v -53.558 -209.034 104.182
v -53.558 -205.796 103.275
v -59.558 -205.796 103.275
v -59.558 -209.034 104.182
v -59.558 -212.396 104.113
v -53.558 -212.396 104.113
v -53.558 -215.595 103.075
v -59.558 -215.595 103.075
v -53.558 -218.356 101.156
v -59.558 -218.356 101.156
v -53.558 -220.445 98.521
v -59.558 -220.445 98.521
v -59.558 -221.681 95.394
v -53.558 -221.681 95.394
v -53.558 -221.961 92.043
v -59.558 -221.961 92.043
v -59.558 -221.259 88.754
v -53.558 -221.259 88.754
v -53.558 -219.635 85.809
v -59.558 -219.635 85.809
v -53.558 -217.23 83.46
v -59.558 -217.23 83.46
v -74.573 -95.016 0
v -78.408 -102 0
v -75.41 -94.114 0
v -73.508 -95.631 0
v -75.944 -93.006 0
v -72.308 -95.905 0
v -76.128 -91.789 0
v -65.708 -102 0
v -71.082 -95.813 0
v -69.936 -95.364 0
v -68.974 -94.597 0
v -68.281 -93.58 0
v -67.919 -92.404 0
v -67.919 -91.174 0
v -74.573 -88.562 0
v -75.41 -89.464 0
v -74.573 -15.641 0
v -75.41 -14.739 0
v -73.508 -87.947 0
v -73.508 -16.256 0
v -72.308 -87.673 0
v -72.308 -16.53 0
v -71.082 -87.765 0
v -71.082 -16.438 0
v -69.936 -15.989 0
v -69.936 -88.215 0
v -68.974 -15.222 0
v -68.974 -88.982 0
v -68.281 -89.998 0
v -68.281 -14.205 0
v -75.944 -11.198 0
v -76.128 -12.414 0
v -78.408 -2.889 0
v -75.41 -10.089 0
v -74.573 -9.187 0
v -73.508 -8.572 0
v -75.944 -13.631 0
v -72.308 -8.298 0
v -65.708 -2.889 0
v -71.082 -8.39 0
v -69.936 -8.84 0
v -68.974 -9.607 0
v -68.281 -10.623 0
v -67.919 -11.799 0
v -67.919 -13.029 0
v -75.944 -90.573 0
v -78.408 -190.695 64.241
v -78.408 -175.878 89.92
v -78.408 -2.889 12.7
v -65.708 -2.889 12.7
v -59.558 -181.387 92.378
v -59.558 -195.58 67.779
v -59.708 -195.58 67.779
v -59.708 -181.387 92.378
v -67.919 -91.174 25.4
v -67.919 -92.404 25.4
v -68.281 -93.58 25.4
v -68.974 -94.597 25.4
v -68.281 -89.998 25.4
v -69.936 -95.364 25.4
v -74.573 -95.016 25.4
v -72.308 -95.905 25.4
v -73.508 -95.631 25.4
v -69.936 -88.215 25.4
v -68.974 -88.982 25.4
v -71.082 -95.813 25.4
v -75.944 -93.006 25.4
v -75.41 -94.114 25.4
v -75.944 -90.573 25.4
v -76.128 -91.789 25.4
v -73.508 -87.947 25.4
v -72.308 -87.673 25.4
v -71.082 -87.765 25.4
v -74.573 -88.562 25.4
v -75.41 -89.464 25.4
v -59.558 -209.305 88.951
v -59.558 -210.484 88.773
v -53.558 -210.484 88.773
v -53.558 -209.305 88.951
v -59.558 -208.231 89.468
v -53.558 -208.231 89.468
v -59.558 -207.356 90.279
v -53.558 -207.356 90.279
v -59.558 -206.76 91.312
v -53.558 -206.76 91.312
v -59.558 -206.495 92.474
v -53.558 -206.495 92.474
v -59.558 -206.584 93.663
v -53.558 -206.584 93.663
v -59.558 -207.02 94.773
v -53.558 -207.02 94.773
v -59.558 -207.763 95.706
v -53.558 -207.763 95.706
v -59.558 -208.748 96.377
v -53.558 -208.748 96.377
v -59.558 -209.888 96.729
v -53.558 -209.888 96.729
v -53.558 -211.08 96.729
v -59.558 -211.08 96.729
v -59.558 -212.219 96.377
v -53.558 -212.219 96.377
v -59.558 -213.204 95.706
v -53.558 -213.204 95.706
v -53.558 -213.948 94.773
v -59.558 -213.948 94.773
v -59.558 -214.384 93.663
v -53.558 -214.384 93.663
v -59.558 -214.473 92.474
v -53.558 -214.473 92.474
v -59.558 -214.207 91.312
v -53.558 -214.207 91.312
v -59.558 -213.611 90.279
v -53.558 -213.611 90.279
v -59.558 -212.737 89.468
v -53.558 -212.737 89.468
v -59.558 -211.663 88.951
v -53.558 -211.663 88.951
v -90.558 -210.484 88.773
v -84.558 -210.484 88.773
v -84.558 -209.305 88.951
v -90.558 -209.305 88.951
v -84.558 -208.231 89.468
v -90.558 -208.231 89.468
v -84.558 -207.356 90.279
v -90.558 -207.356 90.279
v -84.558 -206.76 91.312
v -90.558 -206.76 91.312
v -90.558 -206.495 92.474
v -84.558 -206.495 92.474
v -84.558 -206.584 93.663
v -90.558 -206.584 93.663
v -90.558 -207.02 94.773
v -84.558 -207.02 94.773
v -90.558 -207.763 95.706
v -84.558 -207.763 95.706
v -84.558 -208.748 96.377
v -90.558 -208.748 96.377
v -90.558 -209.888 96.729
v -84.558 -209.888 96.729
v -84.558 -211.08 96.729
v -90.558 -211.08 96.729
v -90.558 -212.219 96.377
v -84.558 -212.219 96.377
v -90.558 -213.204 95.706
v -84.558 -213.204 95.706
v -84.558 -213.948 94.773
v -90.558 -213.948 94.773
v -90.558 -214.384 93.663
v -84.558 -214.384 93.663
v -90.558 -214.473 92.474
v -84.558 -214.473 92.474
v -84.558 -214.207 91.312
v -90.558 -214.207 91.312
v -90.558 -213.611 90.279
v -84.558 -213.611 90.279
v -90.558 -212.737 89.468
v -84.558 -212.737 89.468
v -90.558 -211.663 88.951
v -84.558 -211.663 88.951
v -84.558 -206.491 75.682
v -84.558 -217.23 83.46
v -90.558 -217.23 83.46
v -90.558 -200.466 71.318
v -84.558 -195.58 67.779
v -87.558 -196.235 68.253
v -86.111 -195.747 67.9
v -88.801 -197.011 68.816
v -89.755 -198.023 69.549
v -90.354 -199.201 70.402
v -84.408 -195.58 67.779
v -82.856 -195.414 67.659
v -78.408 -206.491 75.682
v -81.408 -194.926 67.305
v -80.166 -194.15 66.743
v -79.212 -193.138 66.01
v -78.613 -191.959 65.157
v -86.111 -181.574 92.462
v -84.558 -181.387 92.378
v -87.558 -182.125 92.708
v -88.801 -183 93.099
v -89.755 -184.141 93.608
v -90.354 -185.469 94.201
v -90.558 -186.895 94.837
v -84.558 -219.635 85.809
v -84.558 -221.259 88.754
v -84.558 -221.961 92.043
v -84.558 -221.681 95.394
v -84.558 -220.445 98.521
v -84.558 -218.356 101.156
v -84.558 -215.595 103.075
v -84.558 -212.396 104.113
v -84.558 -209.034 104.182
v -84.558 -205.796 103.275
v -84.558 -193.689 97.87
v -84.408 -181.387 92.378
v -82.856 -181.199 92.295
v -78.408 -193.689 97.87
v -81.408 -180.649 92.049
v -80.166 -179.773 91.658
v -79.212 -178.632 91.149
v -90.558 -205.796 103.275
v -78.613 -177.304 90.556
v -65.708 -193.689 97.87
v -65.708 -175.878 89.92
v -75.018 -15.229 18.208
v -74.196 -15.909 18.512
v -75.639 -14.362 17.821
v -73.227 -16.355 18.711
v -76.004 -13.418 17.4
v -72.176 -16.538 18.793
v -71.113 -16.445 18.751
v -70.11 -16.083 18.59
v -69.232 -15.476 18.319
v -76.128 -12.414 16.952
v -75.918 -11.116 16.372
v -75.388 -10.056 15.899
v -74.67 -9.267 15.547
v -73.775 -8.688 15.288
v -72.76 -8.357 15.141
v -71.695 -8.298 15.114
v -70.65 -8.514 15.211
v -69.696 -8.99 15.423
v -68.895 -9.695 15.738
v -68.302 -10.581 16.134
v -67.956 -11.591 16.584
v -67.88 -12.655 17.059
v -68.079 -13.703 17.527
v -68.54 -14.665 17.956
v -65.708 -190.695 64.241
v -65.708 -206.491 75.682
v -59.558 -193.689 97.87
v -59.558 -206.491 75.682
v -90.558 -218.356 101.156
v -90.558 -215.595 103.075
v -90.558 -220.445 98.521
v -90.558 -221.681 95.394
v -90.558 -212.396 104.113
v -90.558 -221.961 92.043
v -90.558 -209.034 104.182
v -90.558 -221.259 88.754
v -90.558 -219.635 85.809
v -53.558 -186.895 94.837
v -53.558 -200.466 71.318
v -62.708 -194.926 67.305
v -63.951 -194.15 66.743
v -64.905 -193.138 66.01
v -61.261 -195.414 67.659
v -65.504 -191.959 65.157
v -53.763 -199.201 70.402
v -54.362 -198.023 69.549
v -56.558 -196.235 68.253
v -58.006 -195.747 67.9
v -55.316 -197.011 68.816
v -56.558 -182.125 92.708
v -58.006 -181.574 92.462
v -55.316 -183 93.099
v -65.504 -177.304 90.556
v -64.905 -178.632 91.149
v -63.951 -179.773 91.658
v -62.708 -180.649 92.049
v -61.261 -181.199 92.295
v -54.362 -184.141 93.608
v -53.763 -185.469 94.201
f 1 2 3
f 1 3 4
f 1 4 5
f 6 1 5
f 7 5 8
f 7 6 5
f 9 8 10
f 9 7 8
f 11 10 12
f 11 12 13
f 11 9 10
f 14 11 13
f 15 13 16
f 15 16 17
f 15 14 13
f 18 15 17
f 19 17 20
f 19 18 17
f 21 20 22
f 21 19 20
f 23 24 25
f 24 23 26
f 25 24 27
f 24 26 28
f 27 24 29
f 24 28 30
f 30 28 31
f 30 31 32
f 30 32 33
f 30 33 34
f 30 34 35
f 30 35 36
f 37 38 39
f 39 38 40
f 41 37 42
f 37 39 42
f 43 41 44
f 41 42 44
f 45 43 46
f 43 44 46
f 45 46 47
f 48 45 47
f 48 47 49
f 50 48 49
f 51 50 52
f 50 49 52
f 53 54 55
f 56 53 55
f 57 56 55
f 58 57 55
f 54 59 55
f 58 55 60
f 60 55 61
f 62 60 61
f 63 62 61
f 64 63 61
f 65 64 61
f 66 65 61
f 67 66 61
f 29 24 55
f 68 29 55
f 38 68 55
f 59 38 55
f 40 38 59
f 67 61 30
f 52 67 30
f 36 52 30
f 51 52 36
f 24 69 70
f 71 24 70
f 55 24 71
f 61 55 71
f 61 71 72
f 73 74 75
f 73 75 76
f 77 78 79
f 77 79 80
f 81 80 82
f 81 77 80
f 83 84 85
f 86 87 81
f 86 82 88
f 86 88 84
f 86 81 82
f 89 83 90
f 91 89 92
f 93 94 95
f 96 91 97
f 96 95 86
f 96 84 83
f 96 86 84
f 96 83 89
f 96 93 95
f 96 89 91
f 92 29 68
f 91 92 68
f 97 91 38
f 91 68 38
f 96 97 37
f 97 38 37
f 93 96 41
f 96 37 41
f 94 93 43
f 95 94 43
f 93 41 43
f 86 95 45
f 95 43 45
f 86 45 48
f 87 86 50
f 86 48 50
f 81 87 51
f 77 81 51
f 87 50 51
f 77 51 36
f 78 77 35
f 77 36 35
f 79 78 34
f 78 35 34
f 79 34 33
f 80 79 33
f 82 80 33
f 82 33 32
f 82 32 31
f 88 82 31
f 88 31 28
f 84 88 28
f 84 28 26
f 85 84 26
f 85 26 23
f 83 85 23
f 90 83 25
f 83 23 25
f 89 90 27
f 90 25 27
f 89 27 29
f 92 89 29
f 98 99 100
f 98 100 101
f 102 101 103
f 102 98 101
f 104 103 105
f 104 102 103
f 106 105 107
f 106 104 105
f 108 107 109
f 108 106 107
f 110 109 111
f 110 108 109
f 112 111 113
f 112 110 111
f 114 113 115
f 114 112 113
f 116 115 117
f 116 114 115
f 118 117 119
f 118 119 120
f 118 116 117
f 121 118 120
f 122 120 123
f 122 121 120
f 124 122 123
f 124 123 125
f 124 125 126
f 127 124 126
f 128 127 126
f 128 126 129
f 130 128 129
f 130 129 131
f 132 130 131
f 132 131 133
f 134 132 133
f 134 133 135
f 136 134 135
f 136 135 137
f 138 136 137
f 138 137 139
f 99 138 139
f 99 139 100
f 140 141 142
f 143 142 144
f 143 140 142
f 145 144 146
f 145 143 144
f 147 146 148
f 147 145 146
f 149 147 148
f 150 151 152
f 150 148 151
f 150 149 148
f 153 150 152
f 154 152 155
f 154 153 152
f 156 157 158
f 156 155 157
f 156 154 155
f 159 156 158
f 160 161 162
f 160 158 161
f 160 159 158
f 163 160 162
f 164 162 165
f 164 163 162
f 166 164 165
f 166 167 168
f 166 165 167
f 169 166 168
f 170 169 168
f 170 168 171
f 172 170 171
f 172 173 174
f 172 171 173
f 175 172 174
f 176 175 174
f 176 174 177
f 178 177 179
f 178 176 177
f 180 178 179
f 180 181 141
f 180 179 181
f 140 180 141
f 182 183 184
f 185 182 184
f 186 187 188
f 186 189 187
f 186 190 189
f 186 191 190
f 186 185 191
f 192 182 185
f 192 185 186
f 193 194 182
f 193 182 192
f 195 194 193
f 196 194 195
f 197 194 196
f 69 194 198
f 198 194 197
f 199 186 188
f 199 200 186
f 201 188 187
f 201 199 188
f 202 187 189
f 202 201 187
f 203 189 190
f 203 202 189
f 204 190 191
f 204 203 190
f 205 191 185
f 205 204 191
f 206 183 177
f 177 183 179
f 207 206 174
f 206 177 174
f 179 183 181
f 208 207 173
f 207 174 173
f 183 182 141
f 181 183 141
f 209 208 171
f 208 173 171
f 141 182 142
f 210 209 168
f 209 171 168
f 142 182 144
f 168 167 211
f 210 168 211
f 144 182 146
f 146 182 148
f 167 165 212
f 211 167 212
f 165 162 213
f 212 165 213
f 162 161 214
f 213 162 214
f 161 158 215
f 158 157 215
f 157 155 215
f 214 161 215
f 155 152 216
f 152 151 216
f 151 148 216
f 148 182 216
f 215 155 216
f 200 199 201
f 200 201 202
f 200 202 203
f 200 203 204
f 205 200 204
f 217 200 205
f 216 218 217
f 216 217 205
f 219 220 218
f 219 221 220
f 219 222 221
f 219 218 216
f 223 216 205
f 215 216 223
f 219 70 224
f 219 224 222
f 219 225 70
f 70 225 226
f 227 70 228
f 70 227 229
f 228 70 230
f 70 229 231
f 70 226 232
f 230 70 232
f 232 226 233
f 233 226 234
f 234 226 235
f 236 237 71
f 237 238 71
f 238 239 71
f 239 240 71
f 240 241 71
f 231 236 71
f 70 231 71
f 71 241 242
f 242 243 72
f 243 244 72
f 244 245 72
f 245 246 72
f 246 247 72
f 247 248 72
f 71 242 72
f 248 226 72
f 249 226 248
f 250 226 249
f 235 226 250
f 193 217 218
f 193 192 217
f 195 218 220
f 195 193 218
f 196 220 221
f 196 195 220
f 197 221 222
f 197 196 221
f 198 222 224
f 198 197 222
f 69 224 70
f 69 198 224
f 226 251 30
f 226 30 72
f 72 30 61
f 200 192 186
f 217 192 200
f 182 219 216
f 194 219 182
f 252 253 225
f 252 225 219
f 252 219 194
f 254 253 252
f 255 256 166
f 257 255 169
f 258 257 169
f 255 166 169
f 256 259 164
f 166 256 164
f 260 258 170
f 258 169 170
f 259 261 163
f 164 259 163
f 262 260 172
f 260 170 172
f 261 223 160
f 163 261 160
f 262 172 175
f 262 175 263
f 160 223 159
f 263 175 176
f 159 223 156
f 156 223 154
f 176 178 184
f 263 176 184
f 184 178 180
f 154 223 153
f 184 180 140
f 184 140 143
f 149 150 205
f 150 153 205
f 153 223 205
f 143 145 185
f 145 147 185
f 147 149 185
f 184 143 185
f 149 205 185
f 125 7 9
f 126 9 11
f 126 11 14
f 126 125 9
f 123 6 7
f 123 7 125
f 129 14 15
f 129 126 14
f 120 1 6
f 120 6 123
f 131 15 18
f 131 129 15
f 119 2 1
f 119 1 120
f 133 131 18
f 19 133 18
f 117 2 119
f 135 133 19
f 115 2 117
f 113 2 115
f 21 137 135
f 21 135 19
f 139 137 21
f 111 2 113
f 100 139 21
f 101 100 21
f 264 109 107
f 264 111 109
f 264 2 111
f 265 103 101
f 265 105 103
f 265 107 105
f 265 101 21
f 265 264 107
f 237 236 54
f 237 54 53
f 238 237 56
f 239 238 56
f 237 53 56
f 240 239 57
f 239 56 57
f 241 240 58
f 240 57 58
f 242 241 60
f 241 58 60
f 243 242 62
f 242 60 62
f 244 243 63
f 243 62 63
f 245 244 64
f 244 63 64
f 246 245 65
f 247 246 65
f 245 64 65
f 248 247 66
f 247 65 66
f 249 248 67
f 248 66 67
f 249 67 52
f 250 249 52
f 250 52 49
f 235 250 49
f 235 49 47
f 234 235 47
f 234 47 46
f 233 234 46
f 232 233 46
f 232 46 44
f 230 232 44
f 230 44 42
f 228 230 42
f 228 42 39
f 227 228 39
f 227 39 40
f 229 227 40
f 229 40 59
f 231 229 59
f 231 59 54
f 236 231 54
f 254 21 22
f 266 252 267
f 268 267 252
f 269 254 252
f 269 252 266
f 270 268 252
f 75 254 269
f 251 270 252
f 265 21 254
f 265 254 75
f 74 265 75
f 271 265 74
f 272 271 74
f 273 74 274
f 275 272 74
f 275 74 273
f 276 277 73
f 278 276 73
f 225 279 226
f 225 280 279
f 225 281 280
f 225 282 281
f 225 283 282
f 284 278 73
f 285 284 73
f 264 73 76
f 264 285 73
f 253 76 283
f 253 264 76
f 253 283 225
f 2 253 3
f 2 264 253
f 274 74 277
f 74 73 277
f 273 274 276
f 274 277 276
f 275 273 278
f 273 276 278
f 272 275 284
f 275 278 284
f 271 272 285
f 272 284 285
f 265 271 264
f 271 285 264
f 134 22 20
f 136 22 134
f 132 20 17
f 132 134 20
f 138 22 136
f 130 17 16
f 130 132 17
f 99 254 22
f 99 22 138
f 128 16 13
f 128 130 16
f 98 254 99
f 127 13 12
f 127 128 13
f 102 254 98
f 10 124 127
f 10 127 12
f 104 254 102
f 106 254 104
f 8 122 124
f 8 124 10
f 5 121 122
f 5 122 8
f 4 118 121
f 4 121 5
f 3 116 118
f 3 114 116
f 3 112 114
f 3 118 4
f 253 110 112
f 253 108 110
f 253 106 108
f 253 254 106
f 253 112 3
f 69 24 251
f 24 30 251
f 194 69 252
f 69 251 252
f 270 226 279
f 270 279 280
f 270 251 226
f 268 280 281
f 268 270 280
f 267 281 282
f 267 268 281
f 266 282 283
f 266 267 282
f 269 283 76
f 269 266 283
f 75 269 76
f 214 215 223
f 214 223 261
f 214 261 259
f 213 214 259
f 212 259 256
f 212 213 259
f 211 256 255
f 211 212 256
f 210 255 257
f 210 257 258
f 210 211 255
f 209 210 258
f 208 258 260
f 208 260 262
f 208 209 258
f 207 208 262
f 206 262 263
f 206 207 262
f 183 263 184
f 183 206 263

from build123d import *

# Parameters (mm, degrees)
SKETCH1_W           = 12.7
SKETCH1_H           = 319.323239592
BOSS_EXTRUDE1_DEPTH = 112.776
SKETCH2_R           = 4
CUT_EXTRUDE1_DEPTH  = 13.7
SKETCH3_R           = 4.1275
CUT_EXTRUDE2_DEPTH  = 25.4
SKETCH4_R           = 4
BOSS_EXTRUDE2_DEPTH = 18.5
CUT_EXTRUDE3_DEPTH  = 12.5
FILLET1_R           = 6


with BuildPart() as part:
    # Sketch1 → Boss-Extrude1 (new body)
    with BuildSketch(Plane.XY):
        with Locations((-72.058445247, -162.550776628)):
            Rectangle(SKETCH1_W, SKETCH1_H)
    extrude(amount=BOSS_EXTRUDE1_DEPTH)

    # Sketch2 → Cut-Extrude1 (cut, through all)
    with BuildSketch(Plane(origin=(-65.708445247, 0, 0), x_dir=(0, 0, -1), z_dir=(1, 0, 0))):
        with BuildLine():
            Line((0, -322.212396424), (0, -102))
            Line((0, -102), (-83.459642539, -217.229583096))
            ThreePointArc((-83.459642539, -217.229583096), (-98.52075591, -220.444553487), (-103.27456158, -205.796191727))
            Line((-103.27456158, -205.796191727), (-12.7, -2.889156832))
            Line((-12.7, -2.889156832), (-112.776, -2.889156832))
            Line((-112.776, -2.889156832), (-112.776, -322.212396424))
            Line((-112.776, -322.212396424), (0, -322.212396424))
        make_face()
        with Locations((-92.773303784, -210.483790762)):
            Circle(SKETCH2_R)
    extrude(amount=-CUT_EXTRUDE1_DEPTH, mode=Mode.SUBTRACT)

    # Sketch3 → Cut-Extrude2 (cut)
    with BuildSketch(Plane(origin=(0, 0, 0), x_dir=(-1, 0, 0), z_dir=(0, 0, -1))):
        with Locations((72, -12.414156832)):
            Circle(SKETCH3_R)
        with Locations((72, -91.789156832)):
            Circle(SKETCH3_R)
    extrude(amount=-CUT_EXTRUDE2_DEPTH, mode=Mode.SUBTRACT)

    # Sketch4 → Boss-Extrude2 (add, symmetric)
    with BuildSketch(Plane(origin=(-72.058445247, 0, 0), x_dir=(0, 0, -1), z_dir=(1, 0, 0))):
        with BuildLine():
            Line((-67.779388484, -195.580447266), (-92.378474043, -181.386547612))
            Line((-92.378474043, -181.386547612), (-103.27456158, -205.796191727))
            ThreePointArc((-103.27456158, -205.796191727), (-98.52075591, -220.444553487), (-83.459642539, -217.229583096))
            Line((-83.459642539, -217.229583096), (-67.779388484, -195.580447266))
        make_face()
        with Locations((-92.773303784, -210.483790762)):
            Circle(SKETCH4_R, mode=Mode.SUBTRACT)
    extrude(amount=BOSS_EXTRUDE2_DEPTH, both=True)

    # Sketch6 → Cut-Extrude3 (cut, symmetric)
    with BuildSketch(Plane(origin=(-72.058445247, 0, 0), x_dir=(0, 0, -1), z_dir=(1, 0, 0))):
        Polygon((-102.882650108, -190.796243791), (-56.569606998, -217.519297579), (-85.086213735, -269.679128088), (-153.833763242, -230.32789021), align=None)
    extrude(amount=CUT_EXTRUDE3_DEPTH, both=True, mode=Mode.SUBTRACT)

    # Fillet1
    fillet1_edges = [part.edges().sort_by_distance(p)[0] for p in [
        (-65.708445247, -188.483497439, 80.078931263),
        (-78.408445247, -188.483497439, 80.078931263),
        (-90.558445247, -188.483497439, 80.078931263),
        (-53.558445247, -188.483497439, 80.078931263),
    ]]
    fillet(fillet1_edges, radius=FILLET1_R)


solid = part.part
